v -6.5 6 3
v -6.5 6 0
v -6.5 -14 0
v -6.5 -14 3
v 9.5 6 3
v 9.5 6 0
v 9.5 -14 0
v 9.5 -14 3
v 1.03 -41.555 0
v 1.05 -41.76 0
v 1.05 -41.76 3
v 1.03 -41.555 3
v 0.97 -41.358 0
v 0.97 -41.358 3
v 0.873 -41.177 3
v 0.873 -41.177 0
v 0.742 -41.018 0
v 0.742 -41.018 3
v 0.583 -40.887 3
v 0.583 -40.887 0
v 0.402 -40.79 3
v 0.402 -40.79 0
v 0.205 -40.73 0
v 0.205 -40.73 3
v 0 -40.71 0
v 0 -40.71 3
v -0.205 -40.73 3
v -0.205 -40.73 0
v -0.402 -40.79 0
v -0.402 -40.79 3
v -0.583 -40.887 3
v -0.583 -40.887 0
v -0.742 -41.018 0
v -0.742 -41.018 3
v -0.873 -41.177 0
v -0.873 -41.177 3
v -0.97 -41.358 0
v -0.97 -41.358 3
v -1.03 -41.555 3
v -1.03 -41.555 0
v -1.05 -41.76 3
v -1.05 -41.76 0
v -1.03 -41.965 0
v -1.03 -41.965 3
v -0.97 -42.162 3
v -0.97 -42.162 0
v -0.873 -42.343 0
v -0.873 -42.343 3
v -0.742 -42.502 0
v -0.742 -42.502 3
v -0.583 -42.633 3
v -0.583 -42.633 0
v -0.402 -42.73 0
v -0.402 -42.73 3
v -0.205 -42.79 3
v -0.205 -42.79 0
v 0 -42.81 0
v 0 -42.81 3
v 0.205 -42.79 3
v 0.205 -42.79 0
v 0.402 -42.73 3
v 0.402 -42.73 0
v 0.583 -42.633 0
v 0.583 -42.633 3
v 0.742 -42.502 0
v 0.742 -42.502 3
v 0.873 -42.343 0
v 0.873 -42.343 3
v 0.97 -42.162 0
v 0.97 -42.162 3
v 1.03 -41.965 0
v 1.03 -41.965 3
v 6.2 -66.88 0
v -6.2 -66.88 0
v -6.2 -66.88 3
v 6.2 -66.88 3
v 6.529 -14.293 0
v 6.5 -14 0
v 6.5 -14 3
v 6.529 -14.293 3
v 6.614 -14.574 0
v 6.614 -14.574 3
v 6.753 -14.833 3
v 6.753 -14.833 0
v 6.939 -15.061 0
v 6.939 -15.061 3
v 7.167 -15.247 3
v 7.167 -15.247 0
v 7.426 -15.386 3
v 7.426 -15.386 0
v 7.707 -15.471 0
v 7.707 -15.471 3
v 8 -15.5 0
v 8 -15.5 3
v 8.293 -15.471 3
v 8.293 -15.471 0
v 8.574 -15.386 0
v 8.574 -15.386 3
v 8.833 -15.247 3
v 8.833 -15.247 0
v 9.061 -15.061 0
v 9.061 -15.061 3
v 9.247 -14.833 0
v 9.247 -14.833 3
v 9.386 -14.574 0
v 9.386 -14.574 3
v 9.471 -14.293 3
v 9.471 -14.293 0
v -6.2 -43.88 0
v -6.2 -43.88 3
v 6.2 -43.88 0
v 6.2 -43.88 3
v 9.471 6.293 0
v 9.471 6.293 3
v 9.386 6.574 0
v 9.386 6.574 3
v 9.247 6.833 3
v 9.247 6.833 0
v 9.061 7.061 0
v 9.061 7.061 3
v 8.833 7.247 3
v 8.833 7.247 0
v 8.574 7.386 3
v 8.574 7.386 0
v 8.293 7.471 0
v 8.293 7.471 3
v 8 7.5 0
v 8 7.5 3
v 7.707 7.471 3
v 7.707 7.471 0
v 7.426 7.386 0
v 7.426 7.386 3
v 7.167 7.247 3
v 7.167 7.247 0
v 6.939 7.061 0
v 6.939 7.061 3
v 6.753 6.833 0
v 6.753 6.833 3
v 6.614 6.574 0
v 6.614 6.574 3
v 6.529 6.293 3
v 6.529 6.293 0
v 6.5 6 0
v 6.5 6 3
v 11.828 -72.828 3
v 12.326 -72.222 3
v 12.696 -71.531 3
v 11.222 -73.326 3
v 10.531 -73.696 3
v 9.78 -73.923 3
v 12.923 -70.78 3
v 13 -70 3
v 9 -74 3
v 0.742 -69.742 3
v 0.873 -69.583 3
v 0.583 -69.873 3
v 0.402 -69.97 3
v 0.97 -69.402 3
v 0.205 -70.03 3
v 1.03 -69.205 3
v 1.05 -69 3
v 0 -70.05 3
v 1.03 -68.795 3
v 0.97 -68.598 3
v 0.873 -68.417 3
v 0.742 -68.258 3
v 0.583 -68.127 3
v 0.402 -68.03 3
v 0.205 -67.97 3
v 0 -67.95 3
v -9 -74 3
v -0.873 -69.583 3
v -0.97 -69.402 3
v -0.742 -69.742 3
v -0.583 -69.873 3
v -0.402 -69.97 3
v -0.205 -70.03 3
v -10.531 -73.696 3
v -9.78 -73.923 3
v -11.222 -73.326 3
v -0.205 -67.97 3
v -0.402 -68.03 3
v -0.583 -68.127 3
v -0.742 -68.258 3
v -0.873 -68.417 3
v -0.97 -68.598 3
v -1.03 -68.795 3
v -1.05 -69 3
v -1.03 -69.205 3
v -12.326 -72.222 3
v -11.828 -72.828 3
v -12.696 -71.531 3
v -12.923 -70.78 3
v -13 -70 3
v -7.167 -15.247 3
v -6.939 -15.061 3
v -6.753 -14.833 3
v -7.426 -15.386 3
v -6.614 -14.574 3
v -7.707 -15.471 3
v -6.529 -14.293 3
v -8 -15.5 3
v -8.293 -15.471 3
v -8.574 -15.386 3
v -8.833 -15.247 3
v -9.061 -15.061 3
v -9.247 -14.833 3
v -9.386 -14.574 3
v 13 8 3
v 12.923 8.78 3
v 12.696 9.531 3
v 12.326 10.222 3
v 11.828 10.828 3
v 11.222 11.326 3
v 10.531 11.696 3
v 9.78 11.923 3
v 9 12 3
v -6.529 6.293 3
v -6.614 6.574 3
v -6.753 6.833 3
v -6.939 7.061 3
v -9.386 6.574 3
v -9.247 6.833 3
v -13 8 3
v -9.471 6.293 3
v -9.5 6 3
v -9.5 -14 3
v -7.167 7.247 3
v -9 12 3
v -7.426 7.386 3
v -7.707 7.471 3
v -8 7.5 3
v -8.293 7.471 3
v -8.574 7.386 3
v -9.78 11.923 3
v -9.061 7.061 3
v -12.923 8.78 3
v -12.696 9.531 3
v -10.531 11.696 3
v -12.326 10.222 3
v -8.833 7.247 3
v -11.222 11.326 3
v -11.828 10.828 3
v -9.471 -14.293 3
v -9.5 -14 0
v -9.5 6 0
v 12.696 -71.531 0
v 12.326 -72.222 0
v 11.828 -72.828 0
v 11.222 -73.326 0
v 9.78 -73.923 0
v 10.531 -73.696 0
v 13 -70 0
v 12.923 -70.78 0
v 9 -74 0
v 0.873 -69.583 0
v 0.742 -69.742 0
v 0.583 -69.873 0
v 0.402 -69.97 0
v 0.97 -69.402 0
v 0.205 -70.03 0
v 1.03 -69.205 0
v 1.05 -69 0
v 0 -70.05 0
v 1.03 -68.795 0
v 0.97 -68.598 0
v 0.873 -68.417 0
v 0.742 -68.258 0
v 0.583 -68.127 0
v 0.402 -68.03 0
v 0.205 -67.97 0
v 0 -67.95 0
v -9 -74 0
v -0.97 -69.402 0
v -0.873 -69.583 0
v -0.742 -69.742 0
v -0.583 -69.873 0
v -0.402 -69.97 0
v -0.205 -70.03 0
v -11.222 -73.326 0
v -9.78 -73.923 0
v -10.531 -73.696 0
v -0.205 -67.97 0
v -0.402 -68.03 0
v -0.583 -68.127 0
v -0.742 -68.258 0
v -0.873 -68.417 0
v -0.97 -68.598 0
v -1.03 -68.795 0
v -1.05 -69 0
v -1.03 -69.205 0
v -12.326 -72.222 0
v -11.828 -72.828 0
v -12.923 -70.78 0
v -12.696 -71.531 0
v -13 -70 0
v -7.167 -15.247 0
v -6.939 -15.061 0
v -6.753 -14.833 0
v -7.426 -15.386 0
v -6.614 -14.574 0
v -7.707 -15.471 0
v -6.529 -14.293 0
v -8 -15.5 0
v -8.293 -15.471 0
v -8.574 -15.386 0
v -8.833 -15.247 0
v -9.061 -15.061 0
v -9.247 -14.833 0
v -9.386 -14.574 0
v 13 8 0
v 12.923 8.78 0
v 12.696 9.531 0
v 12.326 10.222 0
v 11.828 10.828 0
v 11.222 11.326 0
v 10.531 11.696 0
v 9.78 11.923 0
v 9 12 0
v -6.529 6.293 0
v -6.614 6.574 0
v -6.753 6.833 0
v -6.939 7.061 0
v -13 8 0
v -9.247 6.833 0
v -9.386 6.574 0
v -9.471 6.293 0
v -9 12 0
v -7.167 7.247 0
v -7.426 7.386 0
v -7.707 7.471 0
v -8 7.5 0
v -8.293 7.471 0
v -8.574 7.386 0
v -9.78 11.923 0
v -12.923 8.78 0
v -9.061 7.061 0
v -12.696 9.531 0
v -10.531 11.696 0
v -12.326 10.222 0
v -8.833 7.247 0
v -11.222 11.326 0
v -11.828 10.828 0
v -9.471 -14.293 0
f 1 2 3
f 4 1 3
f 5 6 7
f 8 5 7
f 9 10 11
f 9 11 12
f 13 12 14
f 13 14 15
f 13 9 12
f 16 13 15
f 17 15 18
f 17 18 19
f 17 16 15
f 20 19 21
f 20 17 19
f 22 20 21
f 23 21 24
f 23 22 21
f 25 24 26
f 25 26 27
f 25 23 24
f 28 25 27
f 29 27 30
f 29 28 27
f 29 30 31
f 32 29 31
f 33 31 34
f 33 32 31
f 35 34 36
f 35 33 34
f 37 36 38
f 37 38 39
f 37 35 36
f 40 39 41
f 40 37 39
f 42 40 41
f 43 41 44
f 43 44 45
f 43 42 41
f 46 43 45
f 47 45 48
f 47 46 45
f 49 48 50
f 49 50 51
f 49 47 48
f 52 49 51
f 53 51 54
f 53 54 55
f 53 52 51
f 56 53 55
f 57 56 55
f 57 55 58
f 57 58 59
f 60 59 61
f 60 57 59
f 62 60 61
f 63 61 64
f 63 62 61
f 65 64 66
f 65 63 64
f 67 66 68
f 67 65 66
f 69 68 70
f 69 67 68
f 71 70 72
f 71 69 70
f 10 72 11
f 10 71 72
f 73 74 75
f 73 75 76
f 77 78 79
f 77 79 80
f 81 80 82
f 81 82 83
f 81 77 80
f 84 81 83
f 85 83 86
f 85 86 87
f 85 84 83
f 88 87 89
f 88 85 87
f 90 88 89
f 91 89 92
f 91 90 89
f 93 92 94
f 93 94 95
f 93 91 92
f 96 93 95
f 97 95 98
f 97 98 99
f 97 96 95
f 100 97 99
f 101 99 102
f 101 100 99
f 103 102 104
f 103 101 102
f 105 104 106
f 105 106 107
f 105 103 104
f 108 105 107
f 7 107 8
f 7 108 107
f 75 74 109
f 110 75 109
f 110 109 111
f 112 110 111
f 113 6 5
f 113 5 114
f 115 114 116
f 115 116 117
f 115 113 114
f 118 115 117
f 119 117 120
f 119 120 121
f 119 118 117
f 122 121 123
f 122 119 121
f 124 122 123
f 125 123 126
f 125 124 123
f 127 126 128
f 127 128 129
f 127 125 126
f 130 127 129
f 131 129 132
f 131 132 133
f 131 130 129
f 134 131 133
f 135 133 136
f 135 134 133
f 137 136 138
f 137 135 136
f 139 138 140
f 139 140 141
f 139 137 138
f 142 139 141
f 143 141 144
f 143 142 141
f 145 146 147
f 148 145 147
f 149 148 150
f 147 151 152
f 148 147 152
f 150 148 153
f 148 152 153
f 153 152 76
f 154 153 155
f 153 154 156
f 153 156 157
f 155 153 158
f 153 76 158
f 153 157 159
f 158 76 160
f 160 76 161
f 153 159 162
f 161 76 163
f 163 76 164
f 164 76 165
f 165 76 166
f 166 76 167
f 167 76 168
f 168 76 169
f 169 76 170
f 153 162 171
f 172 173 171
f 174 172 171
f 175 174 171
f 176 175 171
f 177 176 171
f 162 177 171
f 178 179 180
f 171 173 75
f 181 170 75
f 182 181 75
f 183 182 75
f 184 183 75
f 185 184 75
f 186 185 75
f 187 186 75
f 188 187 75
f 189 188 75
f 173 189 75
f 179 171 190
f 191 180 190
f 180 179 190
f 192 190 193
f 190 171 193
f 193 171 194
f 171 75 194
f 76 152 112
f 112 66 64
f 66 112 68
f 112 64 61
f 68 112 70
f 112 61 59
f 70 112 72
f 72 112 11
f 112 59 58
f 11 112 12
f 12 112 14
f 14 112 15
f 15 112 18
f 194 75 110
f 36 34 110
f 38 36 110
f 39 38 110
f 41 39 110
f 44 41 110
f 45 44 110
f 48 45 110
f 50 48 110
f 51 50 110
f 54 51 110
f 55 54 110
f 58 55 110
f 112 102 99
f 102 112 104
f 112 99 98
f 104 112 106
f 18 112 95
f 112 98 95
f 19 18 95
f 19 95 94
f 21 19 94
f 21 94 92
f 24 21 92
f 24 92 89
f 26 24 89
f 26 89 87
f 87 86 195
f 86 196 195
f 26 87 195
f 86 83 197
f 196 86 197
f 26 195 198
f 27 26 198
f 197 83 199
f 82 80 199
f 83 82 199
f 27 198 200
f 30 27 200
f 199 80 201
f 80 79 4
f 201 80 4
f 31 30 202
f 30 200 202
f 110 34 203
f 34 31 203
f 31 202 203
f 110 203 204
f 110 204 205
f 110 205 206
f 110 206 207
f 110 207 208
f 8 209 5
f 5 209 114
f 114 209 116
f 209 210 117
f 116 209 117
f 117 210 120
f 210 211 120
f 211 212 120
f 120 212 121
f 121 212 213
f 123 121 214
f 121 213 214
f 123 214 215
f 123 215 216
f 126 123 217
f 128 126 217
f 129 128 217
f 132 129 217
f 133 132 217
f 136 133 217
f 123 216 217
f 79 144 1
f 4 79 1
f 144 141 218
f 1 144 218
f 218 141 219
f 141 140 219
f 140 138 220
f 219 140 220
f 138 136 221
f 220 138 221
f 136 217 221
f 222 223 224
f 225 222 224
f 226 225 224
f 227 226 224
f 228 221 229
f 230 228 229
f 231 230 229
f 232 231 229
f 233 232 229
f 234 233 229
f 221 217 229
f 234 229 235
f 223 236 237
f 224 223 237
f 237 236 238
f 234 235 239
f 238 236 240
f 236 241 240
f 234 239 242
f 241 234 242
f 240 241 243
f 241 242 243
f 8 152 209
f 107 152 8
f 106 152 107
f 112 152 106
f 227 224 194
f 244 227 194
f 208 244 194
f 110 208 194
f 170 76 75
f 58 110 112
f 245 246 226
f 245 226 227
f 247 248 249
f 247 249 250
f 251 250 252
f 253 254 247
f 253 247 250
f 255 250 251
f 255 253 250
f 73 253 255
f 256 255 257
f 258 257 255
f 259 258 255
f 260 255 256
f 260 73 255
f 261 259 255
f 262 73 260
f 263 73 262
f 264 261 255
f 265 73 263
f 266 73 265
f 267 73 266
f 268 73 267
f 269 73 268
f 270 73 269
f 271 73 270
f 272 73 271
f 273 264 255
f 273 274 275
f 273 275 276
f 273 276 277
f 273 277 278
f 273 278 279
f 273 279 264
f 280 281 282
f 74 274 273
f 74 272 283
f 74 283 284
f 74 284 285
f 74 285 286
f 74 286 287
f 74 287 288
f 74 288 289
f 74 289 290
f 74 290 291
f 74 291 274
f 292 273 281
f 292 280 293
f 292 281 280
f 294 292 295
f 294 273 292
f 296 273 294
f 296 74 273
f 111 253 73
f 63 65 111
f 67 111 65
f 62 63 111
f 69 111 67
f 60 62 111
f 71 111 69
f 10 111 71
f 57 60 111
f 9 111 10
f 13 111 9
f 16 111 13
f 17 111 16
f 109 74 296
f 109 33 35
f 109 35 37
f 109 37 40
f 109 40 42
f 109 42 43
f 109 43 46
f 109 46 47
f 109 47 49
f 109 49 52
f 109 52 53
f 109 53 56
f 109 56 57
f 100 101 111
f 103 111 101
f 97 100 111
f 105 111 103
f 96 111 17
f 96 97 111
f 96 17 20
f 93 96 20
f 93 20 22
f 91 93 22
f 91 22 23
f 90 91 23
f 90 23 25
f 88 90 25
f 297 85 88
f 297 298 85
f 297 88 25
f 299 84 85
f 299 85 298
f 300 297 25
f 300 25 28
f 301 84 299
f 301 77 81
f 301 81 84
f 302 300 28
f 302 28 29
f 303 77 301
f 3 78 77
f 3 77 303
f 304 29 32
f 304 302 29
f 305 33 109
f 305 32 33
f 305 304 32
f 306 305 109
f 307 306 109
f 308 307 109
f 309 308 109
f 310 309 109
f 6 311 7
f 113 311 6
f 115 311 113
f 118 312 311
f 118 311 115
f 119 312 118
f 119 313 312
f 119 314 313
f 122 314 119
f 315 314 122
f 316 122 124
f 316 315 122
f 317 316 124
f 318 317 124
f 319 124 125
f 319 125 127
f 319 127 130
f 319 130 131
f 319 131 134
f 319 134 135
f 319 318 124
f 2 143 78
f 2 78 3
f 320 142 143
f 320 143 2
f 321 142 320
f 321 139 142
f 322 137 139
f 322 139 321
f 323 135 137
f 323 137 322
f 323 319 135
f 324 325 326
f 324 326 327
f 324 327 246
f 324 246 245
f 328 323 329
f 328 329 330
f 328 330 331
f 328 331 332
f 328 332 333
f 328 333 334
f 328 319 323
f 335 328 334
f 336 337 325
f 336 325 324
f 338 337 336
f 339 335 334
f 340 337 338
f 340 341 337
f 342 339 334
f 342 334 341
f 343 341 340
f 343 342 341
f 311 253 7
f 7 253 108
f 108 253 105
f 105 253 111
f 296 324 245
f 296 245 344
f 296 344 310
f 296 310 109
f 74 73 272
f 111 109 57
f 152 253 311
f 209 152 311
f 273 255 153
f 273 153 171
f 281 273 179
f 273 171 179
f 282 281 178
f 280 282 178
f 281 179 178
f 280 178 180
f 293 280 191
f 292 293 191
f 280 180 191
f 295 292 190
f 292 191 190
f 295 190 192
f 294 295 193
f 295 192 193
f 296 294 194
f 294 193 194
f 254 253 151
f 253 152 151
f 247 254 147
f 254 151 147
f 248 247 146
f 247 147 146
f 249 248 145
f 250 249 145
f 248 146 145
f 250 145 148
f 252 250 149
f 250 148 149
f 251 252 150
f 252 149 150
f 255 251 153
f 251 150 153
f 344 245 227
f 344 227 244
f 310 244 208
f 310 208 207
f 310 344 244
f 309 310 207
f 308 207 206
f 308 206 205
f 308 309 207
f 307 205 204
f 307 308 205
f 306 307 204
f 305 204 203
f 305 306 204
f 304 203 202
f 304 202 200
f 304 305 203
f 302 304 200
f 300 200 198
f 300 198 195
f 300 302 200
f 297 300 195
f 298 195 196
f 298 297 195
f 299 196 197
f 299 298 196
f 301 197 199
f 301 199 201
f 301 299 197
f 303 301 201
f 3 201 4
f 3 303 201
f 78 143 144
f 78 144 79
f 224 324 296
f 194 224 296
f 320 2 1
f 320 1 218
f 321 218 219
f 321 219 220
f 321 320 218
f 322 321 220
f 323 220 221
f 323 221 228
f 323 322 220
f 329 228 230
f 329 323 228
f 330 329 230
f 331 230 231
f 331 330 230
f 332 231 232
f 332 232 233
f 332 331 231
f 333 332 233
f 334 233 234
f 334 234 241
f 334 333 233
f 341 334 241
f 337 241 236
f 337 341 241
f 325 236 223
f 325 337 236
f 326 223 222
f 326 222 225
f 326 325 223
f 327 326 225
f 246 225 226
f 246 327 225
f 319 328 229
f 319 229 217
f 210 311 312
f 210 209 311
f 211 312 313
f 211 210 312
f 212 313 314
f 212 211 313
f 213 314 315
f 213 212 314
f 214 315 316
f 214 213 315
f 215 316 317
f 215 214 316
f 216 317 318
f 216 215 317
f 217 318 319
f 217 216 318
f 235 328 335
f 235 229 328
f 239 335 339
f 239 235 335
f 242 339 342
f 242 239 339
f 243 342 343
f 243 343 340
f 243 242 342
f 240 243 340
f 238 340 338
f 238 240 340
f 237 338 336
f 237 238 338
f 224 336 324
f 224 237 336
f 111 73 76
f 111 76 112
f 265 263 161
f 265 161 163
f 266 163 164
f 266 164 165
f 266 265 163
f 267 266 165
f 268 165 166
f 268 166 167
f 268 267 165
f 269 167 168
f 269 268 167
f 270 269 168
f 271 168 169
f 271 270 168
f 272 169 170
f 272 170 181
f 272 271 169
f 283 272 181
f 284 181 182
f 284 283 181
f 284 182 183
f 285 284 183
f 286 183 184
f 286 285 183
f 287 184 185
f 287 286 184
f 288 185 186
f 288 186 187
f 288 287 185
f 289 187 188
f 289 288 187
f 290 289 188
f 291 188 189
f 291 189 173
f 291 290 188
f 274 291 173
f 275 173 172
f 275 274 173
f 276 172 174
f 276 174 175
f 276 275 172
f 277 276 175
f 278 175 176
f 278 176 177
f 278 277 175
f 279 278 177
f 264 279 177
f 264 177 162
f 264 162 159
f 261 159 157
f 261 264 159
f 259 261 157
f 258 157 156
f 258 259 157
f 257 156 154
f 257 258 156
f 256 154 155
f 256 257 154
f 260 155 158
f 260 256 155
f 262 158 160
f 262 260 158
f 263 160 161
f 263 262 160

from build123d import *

# Parameters (mm, degrees)
SKETCH_R  = 1.05
SKETCH_W  = 12.4
SKETCH_H  = 23
PAD_DEPTH = 3
FILLET_R  = 4


with BuildPart() as part:
    # Sketch → Pad (new body)
    with BuildSketch(Plane.XY):
        Polygon((13, -50), (13, -74), (-13, -74), (-13, -50), (-13, -20), (-13, 12), (13, 12), (13, -20), align=None)
        with Locations((0, -41.76)):
            Circle(SKETCH_R, mode=Mode.SUBTRACT)
        with Locations((0, -69)):
            Circle(SKETCH_R, mode=Mode.SUBTRACT)
        with Locations((0, -55.38)):
            Rectangle(SKETCH_W, SKETCH_H, mode=Mode.SUBTRACT)
        with BuildLine():
            ThreePointArc((-6.5, 6), (-8, 7.5), (-9.5, 6))
            Line((-9.5, 6), (-9.5, -14))
            ThreePointArc((-9.5, -14), (-8, -15.5), (-6.5, -14))
            Line((-6.5, 6), (-6.5, -14))
        make_face(mode=Mode.SUBTRACT)
        with BuildLine():
            ThreePointArc((9.5, 6), (8, 7.5), (6.5, 6))
            Line((6.5, 6), (6.5, -14))
            ThreePointArc((6.5, -14), (8, -15.5), (9.5, -14))
            Line((9.5, 6), (9.5, -14))
        make_face(mode=Mode.SUBTRACT)
    extrude(amount=PAD_DEPTH)

    # Fillet
    fillet_edges = [part.edges().sort_by_distance(p)[0] for p in [
        (13, -74, 1.5),
        (-13, -74, 1.5),
        (13, 12, 1.5),
        (-13, 12, 1.5),
    ]]
    fillet(fillet_edges, radius=FILLET_R)


solid = part.part
